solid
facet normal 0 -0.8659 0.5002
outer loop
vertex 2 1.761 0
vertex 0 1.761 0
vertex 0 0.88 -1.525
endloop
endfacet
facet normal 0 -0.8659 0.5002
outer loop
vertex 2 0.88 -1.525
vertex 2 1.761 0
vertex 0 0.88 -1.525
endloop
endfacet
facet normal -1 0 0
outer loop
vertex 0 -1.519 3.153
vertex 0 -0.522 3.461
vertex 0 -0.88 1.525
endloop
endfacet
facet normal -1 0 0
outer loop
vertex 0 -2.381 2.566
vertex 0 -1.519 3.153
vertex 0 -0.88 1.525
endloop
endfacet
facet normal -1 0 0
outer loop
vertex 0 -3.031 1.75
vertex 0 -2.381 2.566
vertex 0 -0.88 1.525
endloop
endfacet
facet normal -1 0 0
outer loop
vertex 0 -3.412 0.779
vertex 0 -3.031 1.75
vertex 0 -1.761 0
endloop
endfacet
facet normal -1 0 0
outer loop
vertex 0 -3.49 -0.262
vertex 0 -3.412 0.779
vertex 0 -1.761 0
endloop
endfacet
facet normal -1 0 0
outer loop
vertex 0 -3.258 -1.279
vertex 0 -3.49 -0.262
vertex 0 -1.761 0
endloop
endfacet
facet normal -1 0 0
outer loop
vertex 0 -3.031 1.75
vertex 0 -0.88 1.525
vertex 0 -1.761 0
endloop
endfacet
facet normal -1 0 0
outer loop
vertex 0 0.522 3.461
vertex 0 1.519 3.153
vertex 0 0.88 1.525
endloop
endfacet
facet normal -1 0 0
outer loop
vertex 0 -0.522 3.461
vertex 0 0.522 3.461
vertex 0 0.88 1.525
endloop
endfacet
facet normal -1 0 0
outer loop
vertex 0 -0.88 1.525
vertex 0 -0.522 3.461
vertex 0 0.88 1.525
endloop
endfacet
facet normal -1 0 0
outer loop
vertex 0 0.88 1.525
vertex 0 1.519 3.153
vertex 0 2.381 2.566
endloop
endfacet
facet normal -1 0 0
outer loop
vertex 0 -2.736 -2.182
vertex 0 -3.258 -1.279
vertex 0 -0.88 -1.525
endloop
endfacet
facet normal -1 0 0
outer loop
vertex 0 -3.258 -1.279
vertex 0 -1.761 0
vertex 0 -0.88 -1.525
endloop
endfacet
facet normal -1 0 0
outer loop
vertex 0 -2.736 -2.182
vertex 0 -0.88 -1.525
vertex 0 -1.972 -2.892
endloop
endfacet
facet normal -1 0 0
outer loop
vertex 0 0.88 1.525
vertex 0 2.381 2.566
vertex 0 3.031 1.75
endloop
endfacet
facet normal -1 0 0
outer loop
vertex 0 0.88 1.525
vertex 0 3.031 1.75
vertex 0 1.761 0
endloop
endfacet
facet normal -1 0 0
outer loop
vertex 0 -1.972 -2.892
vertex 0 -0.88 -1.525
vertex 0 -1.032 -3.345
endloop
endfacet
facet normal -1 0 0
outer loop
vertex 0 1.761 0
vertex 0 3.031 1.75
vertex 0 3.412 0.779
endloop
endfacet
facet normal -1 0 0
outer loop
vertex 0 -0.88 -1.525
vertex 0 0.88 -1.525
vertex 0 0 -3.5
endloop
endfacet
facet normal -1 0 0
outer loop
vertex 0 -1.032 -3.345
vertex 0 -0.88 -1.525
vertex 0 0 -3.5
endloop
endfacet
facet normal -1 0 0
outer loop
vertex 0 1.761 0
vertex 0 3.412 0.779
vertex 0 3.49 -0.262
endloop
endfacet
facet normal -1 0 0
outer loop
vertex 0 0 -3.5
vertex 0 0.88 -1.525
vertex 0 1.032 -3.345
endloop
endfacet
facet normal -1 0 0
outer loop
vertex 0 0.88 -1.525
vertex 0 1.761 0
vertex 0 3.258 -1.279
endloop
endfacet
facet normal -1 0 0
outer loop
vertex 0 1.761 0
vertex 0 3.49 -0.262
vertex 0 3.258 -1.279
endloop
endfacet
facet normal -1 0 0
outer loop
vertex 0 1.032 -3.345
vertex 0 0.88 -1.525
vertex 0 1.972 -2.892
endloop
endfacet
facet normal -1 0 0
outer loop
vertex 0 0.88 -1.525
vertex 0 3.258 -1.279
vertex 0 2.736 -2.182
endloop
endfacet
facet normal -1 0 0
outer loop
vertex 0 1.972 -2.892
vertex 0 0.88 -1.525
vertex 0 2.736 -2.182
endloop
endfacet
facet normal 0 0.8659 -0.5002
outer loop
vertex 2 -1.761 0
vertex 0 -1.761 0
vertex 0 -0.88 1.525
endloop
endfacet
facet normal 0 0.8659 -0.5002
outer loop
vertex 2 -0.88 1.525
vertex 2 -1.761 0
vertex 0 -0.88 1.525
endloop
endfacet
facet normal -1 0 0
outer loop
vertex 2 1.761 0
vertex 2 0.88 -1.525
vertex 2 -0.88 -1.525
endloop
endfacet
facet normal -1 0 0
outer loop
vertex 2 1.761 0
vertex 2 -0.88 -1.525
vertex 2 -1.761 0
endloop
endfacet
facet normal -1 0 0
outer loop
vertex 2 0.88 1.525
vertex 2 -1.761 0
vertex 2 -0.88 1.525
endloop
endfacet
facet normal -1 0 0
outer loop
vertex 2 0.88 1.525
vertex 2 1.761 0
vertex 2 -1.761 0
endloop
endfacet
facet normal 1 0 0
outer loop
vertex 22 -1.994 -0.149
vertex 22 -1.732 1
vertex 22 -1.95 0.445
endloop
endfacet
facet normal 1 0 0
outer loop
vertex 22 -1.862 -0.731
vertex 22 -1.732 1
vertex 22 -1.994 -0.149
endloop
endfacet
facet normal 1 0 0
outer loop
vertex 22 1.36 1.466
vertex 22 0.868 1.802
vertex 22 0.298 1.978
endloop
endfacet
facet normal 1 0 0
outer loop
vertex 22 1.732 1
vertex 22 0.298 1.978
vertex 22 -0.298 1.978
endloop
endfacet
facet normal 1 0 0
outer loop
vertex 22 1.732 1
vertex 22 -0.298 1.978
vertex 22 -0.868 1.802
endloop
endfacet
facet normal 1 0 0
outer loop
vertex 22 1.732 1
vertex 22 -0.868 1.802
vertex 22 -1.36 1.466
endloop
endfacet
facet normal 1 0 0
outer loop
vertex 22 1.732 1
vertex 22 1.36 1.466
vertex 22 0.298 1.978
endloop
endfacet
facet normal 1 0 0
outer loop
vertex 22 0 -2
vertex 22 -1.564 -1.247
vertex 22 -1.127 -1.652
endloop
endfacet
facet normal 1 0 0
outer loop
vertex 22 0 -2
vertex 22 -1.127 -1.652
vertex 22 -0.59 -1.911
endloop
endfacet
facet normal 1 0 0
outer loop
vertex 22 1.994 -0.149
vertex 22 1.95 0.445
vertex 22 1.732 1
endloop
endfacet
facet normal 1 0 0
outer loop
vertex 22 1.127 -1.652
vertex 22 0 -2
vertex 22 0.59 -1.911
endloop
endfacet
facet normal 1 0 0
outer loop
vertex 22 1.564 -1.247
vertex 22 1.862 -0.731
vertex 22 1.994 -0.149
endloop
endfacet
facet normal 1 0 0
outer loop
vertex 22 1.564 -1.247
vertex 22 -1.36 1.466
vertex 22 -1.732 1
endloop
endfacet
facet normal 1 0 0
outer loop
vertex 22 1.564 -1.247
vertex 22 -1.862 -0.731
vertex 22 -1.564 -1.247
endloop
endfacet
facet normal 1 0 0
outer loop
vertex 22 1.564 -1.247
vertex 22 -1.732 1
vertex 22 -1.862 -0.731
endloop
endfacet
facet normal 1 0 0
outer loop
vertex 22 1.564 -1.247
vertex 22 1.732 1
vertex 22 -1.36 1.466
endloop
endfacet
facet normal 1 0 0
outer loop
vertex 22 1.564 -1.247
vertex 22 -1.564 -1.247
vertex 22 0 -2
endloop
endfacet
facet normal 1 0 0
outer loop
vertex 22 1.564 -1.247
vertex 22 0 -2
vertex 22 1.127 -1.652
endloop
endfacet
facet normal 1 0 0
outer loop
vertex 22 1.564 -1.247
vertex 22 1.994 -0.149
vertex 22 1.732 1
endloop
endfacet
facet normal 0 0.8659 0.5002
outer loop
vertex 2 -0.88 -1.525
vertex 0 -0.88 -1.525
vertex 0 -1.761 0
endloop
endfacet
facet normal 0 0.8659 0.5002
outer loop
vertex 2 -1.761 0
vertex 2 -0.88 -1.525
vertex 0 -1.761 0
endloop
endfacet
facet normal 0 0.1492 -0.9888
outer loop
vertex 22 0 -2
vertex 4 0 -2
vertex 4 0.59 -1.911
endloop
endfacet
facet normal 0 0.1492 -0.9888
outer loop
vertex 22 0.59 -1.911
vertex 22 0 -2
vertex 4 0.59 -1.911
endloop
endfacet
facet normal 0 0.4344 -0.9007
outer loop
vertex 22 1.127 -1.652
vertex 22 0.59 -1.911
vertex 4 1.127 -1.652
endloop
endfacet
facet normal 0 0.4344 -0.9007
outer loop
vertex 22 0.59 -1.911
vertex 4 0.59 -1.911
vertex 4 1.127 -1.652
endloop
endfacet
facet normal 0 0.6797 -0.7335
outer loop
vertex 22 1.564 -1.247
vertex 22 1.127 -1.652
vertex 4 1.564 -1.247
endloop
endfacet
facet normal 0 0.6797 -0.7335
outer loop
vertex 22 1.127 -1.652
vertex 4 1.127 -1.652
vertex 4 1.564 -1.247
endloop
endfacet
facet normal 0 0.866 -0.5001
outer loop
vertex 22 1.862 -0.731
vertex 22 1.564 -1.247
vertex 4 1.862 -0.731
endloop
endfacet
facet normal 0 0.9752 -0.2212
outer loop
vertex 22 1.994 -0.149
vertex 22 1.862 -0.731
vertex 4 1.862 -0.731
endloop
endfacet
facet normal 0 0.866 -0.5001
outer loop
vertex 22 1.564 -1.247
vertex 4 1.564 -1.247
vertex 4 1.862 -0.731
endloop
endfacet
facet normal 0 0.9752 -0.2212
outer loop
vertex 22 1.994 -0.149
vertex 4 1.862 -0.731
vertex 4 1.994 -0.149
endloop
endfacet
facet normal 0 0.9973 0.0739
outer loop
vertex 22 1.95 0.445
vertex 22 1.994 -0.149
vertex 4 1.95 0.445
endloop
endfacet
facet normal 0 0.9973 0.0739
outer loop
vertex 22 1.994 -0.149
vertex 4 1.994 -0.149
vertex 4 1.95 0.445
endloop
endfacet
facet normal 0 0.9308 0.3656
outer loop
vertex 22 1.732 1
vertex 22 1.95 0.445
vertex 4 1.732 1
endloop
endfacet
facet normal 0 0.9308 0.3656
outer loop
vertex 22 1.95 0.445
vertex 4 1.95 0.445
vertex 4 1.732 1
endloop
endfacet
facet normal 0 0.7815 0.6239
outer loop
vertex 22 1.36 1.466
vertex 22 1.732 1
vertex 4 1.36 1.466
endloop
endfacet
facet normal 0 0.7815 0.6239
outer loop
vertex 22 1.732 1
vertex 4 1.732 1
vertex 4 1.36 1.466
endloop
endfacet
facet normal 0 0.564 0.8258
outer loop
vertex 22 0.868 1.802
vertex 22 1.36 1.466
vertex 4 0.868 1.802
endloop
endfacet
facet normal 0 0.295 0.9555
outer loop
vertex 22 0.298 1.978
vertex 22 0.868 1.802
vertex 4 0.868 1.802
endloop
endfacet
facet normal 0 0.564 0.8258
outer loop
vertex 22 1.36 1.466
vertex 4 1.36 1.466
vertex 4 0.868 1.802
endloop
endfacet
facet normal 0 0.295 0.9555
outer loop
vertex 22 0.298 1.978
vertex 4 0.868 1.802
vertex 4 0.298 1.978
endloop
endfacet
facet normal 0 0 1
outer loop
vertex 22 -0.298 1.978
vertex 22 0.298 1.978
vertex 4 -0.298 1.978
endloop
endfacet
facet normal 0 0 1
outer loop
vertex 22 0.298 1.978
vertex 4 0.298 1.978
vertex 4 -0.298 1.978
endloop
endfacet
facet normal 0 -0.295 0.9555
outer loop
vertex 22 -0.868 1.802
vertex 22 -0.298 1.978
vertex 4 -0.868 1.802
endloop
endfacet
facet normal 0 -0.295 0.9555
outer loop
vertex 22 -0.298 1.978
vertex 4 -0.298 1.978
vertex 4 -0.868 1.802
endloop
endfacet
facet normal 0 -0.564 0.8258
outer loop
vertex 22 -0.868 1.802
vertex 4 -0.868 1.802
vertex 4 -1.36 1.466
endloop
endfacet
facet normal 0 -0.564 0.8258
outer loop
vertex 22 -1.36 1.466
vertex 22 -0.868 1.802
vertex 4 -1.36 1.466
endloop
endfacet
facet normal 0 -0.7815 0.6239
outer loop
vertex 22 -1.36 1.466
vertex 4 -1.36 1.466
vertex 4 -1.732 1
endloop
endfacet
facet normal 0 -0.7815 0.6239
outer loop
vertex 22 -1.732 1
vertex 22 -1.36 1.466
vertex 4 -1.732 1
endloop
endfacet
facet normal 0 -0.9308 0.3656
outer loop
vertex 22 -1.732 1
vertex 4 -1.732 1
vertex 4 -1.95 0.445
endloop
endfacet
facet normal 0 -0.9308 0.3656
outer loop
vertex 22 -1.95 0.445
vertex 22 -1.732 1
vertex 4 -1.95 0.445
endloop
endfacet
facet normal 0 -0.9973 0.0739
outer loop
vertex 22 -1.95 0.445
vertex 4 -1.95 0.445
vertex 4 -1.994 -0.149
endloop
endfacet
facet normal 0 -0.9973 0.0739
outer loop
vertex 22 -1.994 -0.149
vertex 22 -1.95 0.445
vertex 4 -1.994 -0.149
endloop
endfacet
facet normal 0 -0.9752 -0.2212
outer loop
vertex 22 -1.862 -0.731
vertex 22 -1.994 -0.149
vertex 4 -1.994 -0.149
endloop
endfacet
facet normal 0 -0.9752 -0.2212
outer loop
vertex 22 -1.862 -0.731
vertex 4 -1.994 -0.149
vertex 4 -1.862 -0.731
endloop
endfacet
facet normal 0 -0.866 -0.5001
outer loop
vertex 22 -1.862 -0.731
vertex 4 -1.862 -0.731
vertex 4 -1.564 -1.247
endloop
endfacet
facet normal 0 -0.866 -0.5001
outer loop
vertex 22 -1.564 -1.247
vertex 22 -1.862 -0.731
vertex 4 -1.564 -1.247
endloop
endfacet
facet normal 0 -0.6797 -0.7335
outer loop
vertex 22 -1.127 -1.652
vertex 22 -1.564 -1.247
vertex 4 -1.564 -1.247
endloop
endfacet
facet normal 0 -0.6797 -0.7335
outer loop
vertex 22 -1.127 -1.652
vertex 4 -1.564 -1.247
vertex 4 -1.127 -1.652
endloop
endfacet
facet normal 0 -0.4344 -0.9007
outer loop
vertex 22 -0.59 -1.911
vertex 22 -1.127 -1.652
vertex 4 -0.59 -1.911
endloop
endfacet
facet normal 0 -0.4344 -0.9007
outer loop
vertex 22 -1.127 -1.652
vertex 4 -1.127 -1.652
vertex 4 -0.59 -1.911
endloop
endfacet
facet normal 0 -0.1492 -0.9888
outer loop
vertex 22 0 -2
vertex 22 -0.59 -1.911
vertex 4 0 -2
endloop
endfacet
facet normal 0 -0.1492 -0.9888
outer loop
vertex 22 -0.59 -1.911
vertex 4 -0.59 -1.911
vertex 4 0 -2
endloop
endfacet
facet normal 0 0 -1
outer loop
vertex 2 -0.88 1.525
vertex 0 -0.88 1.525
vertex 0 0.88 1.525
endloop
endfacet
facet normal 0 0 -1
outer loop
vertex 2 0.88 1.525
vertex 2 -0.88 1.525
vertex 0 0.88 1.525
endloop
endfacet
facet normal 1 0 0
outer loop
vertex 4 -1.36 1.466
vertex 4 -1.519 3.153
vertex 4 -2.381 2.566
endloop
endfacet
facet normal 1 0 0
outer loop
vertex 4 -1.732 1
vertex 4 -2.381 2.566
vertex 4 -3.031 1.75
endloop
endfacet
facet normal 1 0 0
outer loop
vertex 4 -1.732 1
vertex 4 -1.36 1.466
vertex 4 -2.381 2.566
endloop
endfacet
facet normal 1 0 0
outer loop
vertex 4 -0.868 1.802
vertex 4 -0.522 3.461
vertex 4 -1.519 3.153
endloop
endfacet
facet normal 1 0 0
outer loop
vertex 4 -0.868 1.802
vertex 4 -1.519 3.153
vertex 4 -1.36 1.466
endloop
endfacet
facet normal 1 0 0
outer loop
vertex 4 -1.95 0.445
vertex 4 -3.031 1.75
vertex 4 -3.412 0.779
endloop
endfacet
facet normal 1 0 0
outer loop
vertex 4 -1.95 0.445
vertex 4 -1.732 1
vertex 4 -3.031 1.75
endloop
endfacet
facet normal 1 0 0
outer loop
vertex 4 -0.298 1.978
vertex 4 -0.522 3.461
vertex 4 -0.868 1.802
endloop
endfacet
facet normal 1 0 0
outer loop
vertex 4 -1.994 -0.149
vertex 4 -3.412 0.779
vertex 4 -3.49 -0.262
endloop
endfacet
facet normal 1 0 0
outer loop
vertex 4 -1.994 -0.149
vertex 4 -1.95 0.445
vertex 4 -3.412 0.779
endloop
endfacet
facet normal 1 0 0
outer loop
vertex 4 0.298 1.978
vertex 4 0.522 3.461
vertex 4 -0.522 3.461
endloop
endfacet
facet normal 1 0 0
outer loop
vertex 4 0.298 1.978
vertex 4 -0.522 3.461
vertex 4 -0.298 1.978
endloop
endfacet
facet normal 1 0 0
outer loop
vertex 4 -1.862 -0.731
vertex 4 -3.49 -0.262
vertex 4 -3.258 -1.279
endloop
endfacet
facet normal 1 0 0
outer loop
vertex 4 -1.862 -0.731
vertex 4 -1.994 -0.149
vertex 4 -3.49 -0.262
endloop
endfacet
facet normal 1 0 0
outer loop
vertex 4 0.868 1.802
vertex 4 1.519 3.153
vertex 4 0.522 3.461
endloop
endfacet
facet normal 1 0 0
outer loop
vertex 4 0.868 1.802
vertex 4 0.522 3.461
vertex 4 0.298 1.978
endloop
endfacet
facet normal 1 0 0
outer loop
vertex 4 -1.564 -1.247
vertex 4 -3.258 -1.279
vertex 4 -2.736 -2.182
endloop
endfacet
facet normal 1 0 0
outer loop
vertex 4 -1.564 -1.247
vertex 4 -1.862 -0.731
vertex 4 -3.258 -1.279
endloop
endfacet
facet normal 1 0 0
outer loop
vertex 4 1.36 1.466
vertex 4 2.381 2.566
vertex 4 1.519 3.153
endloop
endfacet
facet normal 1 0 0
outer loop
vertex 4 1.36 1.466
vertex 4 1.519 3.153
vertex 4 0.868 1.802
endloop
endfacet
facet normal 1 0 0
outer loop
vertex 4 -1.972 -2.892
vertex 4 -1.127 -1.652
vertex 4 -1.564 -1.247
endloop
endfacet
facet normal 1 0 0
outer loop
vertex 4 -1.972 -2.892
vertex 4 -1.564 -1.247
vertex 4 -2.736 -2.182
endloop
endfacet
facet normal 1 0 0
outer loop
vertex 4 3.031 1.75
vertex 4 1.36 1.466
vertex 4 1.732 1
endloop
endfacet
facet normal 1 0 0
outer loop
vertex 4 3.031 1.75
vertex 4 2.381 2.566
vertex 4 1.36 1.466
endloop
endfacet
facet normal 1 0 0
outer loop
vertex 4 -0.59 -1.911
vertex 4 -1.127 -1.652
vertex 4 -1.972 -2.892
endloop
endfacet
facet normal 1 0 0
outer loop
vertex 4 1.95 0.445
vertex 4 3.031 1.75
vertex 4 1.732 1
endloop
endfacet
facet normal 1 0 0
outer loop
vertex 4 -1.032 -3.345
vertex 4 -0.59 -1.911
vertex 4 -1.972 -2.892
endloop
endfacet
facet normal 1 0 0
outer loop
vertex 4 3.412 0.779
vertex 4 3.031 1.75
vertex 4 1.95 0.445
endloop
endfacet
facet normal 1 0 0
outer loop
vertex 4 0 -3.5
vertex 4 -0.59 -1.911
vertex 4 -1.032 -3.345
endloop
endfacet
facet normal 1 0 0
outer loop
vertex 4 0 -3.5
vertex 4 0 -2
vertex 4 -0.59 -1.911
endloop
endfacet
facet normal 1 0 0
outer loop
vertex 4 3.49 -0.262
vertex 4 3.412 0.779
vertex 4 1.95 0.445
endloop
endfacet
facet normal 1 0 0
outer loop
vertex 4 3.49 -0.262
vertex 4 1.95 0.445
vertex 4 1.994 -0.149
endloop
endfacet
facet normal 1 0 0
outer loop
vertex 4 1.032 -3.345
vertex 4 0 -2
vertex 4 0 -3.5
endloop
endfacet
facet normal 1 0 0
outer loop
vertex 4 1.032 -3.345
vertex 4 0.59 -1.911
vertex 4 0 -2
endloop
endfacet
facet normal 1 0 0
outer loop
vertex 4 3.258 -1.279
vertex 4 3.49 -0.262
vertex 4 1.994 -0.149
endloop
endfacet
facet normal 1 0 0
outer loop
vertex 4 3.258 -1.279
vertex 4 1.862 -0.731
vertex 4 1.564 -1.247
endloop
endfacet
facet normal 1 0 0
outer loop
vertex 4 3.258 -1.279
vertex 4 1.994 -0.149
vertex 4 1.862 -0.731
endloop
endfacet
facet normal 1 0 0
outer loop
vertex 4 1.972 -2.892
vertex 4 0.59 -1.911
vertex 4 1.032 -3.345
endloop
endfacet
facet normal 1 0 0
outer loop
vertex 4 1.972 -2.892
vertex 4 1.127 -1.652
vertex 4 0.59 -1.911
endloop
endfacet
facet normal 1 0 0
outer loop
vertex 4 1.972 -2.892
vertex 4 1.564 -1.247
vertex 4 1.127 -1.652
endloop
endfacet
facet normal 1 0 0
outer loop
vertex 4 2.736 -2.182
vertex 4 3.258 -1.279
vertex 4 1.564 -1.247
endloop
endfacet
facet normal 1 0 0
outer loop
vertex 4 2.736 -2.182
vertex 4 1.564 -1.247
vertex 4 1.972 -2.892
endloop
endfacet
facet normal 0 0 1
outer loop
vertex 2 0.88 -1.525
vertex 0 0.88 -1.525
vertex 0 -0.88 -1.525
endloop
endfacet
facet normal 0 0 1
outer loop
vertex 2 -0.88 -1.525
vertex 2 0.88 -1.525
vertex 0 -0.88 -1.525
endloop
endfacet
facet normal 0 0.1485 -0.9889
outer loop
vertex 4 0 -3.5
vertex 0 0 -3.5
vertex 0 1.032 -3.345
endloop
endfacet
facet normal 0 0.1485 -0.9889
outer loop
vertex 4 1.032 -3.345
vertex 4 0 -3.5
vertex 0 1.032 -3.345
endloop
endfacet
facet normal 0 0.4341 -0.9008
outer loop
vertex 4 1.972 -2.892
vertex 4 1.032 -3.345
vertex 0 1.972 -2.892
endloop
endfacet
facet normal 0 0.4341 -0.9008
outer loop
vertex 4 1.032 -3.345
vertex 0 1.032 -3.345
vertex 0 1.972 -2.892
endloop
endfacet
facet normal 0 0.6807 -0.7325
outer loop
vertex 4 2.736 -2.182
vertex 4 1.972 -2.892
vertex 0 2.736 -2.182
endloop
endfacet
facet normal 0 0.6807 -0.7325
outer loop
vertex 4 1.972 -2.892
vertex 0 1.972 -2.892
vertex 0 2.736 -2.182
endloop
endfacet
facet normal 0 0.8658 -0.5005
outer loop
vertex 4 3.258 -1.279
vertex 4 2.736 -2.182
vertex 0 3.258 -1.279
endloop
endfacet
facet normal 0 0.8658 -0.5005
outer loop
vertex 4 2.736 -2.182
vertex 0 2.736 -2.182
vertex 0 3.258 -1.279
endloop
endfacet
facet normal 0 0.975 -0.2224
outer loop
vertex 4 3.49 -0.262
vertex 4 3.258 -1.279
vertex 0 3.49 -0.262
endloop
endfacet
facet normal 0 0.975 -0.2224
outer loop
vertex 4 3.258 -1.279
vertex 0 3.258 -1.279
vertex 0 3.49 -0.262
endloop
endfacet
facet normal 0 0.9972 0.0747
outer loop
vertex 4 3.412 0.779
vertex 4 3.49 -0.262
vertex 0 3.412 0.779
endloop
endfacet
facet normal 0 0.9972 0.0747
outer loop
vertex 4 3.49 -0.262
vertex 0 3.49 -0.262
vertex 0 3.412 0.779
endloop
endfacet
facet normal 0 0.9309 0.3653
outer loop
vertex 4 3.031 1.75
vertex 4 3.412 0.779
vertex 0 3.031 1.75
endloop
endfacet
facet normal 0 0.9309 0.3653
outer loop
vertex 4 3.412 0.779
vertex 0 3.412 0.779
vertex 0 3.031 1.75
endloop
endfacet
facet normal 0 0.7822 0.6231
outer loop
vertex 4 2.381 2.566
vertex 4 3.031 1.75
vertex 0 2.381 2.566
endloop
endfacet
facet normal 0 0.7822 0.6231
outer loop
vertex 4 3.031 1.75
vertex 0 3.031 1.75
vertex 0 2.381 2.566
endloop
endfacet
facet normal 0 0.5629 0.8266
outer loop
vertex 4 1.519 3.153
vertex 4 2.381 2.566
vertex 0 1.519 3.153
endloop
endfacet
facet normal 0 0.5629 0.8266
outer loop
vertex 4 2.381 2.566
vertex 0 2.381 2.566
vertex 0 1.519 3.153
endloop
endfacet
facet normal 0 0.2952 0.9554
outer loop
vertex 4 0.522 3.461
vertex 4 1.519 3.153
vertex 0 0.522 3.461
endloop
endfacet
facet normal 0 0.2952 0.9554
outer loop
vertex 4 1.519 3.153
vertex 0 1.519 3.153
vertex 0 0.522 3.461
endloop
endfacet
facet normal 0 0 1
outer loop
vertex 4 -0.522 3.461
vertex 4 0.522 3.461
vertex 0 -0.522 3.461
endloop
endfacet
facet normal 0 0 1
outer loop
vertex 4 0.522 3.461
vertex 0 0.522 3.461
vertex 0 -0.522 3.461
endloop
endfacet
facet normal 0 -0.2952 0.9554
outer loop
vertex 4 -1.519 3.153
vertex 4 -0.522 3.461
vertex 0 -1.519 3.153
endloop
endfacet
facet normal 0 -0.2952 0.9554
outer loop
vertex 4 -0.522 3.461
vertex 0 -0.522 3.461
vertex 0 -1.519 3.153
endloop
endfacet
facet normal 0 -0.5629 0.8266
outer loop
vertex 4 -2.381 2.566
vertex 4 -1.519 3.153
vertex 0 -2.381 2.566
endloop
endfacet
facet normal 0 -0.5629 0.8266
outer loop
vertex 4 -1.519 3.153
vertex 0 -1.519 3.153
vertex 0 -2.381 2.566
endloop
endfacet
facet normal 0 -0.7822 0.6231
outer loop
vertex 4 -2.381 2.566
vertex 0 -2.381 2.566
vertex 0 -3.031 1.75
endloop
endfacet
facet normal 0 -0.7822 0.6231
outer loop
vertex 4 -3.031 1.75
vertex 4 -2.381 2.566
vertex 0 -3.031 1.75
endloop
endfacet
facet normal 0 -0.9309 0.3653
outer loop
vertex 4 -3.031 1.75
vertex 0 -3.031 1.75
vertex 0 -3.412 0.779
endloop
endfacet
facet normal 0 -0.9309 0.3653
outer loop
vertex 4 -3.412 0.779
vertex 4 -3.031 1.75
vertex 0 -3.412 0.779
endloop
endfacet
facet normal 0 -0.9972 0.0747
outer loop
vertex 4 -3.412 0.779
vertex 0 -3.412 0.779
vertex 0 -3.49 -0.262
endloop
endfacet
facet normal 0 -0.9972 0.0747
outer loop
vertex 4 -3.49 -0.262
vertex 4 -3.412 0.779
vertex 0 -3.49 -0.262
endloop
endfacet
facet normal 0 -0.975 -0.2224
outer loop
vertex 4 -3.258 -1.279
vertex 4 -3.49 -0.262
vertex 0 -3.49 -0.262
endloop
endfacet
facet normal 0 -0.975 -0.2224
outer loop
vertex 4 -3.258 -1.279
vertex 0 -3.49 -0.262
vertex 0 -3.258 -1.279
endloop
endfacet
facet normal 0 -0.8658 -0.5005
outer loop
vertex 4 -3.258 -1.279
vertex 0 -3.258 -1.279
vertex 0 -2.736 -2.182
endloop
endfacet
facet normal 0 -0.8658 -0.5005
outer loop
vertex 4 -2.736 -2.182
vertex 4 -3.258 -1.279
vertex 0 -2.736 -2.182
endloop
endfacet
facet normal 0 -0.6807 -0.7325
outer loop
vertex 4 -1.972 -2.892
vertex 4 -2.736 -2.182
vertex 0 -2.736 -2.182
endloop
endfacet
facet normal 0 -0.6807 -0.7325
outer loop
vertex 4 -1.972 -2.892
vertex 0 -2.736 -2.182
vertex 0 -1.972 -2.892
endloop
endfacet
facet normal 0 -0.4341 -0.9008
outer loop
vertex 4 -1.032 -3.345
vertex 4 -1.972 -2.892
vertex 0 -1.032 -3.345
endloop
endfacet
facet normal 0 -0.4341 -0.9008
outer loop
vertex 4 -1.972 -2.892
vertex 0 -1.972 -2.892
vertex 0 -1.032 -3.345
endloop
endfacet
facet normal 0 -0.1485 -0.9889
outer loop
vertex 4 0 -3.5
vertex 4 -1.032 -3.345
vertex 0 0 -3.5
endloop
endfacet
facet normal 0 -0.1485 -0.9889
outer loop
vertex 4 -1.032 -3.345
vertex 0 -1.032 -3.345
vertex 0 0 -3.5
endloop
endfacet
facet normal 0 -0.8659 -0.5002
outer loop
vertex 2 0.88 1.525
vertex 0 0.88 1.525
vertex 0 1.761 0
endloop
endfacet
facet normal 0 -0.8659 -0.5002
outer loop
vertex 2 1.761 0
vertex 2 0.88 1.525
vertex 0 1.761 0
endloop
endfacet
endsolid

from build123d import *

# Parameters (mm, degrees)
SKETCH_1_R          = 3.5
EXTRUDE_1_DEPTH     = 4
CUT_EXTRUDE_1_DEPTH = 2
SKETCH_3_R          = 2
EXTRUDE_2_DEPTH     = 18


with BuildPart() as part:
    # 草图1 → 凸台-拉伸1 (new body)
    with BuildSketch(Plane(origin=(0, 0, 0), x_dir=(0, 0, -1), z_dir=(1, 0, 0))):
        Circle(SKETCH_1_R)
    extrude(amount=EXTRUDE_1_DEPTH)

    # 草图2 → 切除-拉伸1 (cut)
    with BuildSketch(Plane.ZY):
        Polygon((1.525, -0.880459161), (1.525, 0.880459161), (0, 1.760918321), (-1.525, 0.880459161), (-1.525, -0.880459161), (0, -1.760918321), align=None)
    extrude(amount=-CUT_EXTRUDE_1_DEPTH, mode=Mode.SUBTRACT)

    # 草图3 → 凸台-拉伸2 (add)
    with BuildSketch(Plane(origin=(4, 0, 0), x_dir=(0, 0, -1), z_dir=(1, 0, 0))):
        Circle(SKETCH_3_R)
    extrude(amount=EXTRUDE_2_DEPTH)


solid = part.part
